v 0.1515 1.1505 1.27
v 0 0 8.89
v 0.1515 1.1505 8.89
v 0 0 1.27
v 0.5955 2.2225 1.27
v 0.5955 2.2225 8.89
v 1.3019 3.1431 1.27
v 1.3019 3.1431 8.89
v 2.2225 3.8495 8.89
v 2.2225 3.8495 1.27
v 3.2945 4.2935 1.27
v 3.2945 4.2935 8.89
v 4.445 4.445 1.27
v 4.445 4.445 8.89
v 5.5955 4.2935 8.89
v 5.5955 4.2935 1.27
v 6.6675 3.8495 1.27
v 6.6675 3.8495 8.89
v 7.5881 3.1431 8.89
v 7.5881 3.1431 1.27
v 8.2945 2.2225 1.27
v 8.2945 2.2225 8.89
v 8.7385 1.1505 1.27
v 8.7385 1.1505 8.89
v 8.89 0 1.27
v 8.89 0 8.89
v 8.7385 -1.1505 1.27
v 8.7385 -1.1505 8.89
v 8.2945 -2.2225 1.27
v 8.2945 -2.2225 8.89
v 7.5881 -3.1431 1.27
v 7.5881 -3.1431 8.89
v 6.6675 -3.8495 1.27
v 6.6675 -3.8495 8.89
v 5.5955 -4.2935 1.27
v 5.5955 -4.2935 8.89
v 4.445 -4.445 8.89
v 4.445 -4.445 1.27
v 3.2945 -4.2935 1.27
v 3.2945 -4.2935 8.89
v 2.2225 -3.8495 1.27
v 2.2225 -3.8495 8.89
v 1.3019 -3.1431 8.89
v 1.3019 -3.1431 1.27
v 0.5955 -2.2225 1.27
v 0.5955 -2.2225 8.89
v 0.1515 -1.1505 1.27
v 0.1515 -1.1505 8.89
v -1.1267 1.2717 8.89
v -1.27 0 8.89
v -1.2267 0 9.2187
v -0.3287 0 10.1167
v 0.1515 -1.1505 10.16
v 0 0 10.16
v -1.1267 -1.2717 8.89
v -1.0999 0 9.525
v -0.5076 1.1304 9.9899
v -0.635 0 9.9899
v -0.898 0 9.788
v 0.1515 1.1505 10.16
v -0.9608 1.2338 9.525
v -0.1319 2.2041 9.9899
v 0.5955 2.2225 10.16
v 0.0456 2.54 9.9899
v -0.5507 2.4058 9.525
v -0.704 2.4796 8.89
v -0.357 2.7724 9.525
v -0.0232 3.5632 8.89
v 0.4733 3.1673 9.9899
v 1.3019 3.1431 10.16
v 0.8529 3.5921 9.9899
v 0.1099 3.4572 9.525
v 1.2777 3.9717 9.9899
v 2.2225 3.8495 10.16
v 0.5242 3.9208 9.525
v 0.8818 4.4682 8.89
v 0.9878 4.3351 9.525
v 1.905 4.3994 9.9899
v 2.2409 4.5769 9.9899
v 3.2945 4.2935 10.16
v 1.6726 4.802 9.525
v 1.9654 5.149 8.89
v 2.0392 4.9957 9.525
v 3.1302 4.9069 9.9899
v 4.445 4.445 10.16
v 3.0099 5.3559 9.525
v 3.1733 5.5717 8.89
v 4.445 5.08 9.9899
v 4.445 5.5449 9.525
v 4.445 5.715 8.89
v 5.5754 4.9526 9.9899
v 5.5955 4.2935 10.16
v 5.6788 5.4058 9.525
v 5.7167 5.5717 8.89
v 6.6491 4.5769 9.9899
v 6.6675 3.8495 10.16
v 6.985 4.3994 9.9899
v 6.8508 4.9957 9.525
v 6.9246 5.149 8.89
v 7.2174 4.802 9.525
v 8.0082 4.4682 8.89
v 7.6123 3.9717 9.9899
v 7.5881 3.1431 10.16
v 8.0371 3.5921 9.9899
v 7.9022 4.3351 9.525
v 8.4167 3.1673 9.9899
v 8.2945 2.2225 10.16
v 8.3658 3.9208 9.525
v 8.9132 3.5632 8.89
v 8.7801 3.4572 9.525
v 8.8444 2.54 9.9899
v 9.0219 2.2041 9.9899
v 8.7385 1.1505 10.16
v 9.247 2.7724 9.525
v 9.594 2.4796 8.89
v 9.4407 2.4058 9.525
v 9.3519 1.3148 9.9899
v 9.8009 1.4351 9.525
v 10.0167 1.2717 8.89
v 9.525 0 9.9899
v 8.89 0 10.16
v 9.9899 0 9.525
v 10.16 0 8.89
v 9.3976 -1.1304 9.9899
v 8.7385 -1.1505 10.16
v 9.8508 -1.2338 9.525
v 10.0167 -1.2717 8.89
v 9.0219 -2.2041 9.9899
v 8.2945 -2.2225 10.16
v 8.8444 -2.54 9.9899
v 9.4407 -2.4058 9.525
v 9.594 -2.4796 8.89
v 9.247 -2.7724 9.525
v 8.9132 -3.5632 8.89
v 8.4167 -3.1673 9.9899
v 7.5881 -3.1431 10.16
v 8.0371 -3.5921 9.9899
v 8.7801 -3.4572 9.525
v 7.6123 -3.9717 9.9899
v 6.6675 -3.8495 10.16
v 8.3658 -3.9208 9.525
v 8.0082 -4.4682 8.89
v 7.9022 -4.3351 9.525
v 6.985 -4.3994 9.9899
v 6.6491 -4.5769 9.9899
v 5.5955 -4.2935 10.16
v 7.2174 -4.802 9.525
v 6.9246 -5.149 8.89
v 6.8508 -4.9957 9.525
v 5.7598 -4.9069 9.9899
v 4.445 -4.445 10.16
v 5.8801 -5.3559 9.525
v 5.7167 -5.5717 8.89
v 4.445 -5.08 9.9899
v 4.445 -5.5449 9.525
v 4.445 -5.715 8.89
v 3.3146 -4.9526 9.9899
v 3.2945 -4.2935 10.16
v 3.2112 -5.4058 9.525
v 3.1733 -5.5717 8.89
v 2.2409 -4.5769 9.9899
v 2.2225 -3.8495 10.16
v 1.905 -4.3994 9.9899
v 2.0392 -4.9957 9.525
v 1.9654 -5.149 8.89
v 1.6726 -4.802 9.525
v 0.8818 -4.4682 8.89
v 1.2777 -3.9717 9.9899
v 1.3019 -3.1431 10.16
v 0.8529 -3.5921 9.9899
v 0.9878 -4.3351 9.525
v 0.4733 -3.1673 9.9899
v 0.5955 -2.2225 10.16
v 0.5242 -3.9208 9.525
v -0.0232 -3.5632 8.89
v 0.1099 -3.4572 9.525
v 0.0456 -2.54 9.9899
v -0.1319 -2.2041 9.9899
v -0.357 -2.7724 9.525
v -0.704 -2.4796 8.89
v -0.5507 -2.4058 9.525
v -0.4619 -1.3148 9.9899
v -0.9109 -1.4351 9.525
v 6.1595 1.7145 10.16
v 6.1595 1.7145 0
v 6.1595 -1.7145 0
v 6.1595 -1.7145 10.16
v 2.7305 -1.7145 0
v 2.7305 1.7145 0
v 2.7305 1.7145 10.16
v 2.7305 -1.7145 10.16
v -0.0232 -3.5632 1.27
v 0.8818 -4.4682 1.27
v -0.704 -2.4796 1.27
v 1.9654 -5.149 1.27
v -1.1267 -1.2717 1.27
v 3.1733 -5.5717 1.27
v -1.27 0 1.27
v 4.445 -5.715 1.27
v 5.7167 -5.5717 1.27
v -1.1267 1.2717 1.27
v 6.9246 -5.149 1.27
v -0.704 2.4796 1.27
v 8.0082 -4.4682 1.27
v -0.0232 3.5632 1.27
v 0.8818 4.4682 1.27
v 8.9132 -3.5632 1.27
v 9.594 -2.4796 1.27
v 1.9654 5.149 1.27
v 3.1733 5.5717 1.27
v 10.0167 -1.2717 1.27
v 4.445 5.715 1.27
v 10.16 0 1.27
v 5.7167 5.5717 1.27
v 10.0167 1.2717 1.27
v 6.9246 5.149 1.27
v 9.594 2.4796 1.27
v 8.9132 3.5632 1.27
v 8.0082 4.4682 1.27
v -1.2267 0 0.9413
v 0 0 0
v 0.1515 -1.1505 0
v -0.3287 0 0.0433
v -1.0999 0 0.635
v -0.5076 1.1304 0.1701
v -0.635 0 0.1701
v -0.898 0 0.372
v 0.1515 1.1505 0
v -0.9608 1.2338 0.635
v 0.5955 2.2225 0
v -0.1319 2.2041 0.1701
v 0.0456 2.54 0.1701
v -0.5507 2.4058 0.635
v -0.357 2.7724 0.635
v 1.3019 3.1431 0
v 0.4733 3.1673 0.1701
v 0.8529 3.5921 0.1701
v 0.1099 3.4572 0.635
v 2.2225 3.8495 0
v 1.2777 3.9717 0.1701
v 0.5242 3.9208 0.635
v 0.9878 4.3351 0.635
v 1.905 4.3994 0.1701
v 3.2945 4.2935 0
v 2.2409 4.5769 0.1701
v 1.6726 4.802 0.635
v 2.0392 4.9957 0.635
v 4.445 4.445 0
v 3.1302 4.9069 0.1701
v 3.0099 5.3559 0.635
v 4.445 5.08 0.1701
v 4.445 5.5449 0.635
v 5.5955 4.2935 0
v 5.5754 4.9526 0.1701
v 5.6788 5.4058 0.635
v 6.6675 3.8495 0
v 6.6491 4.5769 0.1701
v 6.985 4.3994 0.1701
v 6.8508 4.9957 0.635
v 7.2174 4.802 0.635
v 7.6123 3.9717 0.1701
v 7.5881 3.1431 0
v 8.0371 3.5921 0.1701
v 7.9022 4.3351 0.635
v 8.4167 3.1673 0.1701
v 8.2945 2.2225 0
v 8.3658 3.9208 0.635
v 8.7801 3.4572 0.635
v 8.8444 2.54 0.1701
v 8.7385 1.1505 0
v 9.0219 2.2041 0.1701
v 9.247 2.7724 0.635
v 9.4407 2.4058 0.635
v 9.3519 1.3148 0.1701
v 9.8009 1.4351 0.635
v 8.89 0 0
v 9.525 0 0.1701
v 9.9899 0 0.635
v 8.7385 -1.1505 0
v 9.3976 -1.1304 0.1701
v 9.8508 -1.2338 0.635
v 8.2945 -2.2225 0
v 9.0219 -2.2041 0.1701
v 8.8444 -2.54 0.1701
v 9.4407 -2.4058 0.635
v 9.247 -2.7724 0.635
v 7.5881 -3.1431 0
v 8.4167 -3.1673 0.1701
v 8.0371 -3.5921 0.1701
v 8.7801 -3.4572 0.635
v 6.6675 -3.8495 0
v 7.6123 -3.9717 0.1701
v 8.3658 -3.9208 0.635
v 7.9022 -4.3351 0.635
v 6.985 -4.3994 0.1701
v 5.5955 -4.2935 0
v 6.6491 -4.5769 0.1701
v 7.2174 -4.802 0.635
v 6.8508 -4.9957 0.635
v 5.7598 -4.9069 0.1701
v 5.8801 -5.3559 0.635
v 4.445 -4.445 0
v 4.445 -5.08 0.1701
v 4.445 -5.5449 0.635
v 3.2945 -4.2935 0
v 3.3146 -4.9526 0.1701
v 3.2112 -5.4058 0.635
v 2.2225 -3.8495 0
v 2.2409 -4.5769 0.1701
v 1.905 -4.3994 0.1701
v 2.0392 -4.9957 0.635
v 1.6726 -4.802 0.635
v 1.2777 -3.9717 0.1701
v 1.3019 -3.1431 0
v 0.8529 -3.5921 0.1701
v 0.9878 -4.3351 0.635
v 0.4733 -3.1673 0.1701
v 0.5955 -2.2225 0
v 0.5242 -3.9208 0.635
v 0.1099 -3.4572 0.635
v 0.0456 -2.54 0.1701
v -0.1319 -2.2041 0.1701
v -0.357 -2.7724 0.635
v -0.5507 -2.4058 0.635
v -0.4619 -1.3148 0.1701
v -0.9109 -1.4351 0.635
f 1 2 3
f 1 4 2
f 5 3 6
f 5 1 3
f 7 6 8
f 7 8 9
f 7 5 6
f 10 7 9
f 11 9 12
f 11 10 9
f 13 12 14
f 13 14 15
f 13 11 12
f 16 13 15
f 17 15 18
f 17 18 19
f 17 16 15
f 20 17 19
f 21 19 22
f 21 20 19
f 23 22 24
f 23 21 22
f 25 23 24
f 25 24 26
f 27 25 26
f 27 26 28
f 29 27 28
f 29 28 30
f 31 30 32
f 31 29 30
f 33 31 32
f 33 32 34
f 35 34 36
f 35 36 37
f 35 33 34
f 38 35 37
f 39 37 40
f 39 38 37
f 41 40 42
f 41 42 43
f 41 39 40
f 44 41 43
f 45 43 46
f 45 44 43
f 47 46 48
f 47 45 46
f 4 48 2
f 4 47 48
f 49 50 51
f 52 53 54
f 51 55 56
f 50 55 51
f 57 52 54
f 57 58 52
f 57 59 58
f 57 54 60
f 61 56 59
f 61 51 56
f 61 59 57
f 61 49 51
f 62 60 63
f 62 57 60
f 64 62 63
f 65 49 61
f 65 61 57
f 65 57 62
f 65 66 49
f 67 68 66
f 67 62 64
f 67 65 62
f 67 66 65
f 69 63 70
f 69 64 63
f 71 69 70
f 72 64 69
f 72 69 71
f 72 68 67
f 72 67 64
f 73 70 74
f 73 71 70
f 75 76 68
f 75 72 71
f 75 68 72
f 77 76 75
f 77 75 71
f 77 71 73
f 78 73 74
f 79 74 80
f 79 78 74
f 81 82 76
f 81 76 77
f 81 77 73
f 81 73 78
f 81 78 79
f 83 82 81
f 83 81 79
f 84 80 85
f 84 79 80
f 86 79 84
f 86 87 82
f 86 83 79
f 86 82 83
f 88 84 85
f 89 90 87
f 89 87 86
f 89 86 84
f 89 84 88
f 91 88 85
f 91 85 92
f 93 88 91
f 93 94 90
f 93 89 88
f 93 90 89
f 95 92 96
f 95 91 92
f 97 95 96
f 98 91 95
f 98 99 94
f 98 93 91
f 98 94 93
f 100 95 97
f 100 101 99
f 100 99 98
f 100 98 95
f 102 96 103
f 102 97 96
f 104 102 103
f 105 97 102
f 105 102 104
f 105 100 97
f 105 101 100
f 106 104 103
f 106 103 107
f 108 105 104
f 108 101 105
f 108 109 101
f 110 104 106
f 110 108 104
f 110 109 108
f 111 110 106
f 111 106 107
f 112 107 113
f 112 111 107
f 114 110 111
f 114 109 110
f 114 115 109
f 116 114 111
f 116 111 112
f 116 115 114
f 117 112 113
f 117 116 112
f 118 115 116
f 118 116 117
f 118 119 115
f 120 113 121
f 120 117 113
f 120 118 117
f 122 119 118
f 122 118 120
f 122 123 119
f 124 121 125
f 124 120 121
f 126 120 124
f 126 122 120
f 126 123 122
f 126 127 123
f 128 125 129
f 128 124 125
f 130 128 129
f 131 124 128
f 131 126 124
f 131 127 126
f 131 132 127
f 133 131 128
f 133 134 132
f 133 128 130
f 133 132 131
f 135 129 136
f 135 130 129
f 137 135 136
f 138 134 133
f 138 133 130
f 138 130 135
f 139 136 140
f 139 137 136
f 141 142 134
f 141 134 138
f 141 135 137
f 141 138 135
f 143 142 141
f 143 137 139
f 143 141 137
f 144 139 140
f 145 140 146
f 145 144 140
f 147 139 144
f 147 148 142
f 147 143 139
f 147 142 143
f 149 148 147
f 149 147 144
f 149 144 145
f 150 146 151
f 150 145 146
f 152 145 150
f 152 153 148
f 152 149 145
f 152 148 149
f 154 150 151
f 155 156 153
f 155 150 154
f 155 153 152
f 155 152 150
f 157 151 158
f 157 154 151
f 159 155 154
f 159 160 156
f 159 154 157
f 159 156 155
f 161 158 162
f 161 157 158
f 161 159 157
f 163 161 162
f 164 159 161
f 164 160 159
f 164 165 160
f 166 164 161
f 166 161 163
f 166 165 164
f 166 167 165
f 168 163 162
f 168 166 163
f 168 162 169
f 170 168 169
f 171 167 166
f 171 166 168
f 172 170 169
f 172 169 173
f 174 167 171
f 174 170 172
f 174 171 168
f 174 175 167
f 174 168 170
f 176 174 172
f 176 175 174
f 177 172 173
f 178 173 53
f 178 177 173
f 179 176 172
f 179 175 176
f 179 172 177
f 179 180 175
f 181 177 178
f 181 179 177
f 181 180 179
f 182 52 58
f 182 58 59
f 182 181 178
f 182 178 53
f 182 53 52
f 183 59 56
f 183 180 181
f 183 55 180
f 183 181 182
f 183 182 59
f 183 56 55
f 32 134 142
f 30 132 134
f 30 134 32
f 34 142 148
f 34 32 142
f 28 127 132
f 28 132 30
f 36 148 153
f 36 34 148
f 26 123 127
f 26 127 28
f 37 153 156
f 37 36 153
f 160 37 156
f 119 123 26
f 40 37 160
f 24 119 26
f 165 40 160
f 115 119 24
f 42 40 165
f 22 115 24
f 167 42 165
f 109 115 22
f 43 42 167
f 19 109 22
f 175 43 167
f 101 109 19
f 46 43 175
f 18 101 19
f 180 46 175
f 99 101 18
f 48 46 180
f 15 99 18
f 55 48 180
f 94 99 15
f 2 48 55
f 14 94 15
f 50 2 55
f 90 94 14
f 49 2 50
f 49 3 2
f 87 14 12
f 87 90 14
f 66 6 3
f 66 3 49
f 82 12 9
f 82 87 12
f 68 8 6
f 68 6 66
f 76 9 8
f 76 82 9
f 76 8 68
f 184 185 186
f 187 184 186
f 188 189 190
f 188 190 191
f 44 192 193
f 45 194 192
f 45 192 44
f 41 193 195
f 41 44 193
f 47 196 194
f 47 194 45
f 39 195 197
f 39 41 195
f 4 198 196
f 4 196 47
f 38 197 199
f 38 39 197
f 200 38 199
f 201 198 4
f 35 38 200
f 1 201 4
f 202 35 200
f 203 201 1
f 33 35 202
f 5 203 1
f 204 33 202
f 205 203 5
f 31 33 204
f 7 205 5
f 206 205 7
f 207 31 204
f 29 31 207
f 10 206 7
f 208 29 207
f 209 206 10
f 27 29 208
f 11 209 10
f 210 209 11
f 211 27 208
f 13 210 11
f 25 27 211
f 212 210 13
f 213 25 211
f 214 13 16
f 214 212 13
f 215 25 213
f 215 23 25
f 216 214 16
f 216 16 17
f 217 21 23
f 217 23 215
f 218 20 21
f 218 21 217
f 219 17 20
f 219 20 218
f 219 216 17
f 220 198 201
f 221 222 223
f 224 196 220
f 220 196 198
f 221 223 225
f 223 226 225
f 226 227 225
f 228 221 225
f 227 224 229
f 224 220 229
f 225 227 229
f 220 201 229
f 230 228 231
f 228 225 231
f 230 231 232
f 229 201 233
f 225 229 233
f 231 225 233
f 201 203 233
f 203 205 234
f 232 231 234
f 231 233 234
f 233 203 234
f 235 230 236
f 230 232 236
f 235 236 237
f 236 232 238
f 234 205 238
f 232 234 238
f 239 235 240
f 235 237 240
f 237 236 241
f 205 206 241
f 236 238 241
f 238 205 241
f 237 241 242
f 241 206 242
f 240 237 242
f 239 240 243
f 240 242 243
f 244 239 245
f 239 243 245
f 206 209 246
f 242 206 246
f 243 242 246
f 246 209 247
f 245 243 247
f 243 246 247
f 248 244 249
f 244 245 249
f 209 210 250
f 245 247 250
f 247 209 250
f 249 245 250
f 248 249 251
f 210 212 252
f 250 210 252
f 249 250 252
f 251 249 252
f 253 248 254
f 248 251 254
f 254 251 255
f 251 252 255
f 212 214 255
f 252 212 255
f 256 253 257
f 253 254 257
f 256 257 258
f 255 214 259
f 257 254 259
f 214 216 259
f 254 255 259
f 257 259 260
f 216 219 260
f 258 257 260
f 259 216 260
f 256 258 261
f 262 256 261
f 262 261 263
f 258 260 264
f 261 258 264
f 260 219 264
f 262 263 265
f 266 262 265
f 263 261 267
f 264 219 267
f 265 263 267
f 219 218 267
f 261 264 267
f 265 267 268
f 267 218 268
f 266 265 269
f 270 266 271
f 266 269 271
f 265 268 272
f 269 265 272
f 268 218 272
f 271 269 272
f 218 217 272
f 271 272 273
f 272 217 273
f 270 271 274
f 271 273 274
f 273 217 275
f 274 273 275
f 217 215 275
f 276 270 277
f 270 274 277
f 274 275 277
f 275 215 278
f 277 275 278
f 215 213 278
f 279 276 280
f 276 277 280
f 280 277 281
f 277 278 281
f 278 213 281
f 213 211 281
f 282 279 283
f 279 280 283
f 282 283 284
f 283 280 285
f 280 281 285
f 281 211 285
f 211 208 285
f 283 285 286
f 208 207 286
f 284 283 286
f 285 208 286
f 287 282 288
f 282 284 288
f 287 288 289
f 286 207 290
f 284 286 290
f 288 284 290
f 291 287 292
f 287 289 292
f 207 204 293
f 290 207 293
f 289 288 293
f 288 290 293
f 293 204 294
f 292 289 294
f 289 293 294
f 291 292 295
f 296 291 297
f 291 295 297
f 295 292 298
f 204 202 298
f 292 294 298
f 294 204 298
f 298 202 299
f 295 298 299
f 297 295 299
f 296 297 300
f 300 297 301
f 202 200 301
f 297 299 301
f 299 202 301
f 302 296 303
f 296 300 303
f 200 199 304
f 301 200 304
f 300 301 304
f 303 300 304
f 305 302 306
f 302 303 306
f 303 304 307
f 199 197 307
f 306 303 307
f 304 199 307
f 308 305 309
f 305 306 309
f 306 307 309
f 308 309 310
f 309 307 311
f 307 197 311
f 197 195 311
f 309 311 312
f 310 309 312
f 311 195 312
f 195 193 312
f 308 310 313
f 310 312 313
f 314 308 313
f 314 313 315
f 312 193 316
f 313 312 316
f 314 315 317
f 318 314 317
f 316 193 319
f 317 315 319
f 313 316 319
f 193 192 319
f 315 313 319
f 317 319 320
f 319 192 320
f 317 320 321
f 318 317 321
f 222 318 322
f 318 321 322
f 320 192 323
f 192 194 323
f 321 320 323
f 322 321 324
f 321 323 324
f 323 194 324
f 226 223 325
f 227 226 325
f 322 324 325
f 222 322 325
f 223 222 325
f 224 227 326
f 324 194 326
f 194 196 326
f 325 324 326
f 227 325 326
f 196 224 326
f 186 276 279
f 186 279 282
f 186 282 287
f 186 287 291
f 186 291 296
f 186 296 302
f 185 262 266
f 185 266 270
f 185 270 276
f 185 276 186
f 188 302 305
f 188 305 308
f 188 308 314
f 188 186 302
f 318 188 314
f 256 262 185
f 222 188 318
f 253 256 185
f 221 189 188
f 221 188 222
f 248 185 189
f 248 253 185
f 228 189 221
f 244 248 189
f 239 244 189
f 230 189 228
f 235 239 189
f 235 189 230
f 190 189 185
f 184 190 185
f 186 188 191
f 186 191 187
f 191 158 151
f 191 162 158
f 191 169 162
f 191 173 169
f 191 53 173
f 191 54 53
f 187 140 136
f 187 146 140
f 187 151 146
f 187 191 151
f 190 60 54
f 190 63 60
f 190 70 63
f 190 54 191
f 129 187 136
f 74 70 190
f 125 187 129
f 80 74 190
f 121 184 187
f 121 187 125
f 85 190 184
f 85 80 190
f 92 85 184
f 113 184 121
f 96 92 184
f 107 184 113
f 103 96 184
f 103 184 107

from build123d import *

# Parameters (mm, degrees)
F2_W     = 3.429
F2_H     = 3.429
F3_DEPTH = 25.4
F4_R     = 1.26999
F5_R     = 1.26999


# Not quite as in the source:
# - a fillet or chamfer is up to 0.001 mm smaller than in the source, because OpenCascade refuses the exact size


with BuildPart() as f1:
    # F0 (on Front) → F1 (revolve)
    with BuildSketch(Plane.XZ):
        Polygon((-1.27, 0), (0, 0), (4.445, 0), (4.445, 10.16), (0, 10.16), (-1.27, 10.16), (-1.27, 8.89), (0, 8.89), (0, 1.27), (-1.27, 1.27), align=None)
    revolve(axis=Axis((4.445, 0, 5.08), (0, 0, -1)))

    # F2 (on face) → F3 (cut)
    with BuildSketch(Plane(origin=(0, 0, 0), x_dir=(1, 0, 0), z_dir=(0, 0, -1))):
        with Locations((4.445, 0)):
            Rectangle(F2_W, F2_H)
    extrude(amount=-F3_DEPTH, mode=Mode.SUBTRACT)

    # F4 (radius 1.27 in the source; OpenCascade refuses exactly that, so slightly less here)
    f4_edges = [f1.edges().sort_by_distance(p)[0] for p in [
        (10.16, 0, 0),
    ]]
    fillet(f4_edges, radius=F4_R)

    # F5 (radius 1.27 in the source; OpenCascade refuses exactly that, so slightly less here)
    f5_edges = [f1.edges().sort_by_distance(p)[0] for p in [
        (10.16, 0, 10.16),
    ]]
    fillet(f5_edges, radius=F5_R)


solid = f1.part
